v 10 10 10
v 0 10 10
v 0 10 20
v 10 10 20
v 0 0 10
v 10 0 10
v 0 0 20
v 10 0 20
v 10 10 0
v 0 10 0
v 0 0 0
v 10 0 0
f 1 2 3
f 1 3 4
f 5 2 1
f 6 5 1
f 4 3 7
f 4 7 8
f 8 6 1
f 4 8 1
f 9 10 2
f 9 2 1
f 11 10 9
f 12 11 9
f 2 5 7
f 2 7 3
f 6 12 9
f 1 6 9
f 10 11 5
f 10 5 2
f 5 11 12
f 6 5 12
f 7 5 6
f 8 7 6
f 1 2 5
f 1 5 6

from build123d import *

# Parameters (mm, degrees)
BOX_W        = 10
BOX_H        = 10
BOX_DEPTH    = 10
BOX001_W     = 10
BOX001_H     = 10
BOX001_DEPTH = 10


with BuildPart() as box:
    # Box → Box (new body)
    with BuildSketch(Plane.XY.offset(10)):
        with Locations((5, 5)):
            Rectangle(BOX_W, BOX_H)
    extrude(amount=BOX_DEPTH)


with BuildPart() as box001:
    # Box001 → Box001 (new body)
    with BuildSketch(Plane.XY):
        with Locations((5, 5)):
            Rectangle(BOX001_W, BOX001_H)
    extrude(amount=BOX001_DEPTH)


solid = Compound([box.part, box001.part])
